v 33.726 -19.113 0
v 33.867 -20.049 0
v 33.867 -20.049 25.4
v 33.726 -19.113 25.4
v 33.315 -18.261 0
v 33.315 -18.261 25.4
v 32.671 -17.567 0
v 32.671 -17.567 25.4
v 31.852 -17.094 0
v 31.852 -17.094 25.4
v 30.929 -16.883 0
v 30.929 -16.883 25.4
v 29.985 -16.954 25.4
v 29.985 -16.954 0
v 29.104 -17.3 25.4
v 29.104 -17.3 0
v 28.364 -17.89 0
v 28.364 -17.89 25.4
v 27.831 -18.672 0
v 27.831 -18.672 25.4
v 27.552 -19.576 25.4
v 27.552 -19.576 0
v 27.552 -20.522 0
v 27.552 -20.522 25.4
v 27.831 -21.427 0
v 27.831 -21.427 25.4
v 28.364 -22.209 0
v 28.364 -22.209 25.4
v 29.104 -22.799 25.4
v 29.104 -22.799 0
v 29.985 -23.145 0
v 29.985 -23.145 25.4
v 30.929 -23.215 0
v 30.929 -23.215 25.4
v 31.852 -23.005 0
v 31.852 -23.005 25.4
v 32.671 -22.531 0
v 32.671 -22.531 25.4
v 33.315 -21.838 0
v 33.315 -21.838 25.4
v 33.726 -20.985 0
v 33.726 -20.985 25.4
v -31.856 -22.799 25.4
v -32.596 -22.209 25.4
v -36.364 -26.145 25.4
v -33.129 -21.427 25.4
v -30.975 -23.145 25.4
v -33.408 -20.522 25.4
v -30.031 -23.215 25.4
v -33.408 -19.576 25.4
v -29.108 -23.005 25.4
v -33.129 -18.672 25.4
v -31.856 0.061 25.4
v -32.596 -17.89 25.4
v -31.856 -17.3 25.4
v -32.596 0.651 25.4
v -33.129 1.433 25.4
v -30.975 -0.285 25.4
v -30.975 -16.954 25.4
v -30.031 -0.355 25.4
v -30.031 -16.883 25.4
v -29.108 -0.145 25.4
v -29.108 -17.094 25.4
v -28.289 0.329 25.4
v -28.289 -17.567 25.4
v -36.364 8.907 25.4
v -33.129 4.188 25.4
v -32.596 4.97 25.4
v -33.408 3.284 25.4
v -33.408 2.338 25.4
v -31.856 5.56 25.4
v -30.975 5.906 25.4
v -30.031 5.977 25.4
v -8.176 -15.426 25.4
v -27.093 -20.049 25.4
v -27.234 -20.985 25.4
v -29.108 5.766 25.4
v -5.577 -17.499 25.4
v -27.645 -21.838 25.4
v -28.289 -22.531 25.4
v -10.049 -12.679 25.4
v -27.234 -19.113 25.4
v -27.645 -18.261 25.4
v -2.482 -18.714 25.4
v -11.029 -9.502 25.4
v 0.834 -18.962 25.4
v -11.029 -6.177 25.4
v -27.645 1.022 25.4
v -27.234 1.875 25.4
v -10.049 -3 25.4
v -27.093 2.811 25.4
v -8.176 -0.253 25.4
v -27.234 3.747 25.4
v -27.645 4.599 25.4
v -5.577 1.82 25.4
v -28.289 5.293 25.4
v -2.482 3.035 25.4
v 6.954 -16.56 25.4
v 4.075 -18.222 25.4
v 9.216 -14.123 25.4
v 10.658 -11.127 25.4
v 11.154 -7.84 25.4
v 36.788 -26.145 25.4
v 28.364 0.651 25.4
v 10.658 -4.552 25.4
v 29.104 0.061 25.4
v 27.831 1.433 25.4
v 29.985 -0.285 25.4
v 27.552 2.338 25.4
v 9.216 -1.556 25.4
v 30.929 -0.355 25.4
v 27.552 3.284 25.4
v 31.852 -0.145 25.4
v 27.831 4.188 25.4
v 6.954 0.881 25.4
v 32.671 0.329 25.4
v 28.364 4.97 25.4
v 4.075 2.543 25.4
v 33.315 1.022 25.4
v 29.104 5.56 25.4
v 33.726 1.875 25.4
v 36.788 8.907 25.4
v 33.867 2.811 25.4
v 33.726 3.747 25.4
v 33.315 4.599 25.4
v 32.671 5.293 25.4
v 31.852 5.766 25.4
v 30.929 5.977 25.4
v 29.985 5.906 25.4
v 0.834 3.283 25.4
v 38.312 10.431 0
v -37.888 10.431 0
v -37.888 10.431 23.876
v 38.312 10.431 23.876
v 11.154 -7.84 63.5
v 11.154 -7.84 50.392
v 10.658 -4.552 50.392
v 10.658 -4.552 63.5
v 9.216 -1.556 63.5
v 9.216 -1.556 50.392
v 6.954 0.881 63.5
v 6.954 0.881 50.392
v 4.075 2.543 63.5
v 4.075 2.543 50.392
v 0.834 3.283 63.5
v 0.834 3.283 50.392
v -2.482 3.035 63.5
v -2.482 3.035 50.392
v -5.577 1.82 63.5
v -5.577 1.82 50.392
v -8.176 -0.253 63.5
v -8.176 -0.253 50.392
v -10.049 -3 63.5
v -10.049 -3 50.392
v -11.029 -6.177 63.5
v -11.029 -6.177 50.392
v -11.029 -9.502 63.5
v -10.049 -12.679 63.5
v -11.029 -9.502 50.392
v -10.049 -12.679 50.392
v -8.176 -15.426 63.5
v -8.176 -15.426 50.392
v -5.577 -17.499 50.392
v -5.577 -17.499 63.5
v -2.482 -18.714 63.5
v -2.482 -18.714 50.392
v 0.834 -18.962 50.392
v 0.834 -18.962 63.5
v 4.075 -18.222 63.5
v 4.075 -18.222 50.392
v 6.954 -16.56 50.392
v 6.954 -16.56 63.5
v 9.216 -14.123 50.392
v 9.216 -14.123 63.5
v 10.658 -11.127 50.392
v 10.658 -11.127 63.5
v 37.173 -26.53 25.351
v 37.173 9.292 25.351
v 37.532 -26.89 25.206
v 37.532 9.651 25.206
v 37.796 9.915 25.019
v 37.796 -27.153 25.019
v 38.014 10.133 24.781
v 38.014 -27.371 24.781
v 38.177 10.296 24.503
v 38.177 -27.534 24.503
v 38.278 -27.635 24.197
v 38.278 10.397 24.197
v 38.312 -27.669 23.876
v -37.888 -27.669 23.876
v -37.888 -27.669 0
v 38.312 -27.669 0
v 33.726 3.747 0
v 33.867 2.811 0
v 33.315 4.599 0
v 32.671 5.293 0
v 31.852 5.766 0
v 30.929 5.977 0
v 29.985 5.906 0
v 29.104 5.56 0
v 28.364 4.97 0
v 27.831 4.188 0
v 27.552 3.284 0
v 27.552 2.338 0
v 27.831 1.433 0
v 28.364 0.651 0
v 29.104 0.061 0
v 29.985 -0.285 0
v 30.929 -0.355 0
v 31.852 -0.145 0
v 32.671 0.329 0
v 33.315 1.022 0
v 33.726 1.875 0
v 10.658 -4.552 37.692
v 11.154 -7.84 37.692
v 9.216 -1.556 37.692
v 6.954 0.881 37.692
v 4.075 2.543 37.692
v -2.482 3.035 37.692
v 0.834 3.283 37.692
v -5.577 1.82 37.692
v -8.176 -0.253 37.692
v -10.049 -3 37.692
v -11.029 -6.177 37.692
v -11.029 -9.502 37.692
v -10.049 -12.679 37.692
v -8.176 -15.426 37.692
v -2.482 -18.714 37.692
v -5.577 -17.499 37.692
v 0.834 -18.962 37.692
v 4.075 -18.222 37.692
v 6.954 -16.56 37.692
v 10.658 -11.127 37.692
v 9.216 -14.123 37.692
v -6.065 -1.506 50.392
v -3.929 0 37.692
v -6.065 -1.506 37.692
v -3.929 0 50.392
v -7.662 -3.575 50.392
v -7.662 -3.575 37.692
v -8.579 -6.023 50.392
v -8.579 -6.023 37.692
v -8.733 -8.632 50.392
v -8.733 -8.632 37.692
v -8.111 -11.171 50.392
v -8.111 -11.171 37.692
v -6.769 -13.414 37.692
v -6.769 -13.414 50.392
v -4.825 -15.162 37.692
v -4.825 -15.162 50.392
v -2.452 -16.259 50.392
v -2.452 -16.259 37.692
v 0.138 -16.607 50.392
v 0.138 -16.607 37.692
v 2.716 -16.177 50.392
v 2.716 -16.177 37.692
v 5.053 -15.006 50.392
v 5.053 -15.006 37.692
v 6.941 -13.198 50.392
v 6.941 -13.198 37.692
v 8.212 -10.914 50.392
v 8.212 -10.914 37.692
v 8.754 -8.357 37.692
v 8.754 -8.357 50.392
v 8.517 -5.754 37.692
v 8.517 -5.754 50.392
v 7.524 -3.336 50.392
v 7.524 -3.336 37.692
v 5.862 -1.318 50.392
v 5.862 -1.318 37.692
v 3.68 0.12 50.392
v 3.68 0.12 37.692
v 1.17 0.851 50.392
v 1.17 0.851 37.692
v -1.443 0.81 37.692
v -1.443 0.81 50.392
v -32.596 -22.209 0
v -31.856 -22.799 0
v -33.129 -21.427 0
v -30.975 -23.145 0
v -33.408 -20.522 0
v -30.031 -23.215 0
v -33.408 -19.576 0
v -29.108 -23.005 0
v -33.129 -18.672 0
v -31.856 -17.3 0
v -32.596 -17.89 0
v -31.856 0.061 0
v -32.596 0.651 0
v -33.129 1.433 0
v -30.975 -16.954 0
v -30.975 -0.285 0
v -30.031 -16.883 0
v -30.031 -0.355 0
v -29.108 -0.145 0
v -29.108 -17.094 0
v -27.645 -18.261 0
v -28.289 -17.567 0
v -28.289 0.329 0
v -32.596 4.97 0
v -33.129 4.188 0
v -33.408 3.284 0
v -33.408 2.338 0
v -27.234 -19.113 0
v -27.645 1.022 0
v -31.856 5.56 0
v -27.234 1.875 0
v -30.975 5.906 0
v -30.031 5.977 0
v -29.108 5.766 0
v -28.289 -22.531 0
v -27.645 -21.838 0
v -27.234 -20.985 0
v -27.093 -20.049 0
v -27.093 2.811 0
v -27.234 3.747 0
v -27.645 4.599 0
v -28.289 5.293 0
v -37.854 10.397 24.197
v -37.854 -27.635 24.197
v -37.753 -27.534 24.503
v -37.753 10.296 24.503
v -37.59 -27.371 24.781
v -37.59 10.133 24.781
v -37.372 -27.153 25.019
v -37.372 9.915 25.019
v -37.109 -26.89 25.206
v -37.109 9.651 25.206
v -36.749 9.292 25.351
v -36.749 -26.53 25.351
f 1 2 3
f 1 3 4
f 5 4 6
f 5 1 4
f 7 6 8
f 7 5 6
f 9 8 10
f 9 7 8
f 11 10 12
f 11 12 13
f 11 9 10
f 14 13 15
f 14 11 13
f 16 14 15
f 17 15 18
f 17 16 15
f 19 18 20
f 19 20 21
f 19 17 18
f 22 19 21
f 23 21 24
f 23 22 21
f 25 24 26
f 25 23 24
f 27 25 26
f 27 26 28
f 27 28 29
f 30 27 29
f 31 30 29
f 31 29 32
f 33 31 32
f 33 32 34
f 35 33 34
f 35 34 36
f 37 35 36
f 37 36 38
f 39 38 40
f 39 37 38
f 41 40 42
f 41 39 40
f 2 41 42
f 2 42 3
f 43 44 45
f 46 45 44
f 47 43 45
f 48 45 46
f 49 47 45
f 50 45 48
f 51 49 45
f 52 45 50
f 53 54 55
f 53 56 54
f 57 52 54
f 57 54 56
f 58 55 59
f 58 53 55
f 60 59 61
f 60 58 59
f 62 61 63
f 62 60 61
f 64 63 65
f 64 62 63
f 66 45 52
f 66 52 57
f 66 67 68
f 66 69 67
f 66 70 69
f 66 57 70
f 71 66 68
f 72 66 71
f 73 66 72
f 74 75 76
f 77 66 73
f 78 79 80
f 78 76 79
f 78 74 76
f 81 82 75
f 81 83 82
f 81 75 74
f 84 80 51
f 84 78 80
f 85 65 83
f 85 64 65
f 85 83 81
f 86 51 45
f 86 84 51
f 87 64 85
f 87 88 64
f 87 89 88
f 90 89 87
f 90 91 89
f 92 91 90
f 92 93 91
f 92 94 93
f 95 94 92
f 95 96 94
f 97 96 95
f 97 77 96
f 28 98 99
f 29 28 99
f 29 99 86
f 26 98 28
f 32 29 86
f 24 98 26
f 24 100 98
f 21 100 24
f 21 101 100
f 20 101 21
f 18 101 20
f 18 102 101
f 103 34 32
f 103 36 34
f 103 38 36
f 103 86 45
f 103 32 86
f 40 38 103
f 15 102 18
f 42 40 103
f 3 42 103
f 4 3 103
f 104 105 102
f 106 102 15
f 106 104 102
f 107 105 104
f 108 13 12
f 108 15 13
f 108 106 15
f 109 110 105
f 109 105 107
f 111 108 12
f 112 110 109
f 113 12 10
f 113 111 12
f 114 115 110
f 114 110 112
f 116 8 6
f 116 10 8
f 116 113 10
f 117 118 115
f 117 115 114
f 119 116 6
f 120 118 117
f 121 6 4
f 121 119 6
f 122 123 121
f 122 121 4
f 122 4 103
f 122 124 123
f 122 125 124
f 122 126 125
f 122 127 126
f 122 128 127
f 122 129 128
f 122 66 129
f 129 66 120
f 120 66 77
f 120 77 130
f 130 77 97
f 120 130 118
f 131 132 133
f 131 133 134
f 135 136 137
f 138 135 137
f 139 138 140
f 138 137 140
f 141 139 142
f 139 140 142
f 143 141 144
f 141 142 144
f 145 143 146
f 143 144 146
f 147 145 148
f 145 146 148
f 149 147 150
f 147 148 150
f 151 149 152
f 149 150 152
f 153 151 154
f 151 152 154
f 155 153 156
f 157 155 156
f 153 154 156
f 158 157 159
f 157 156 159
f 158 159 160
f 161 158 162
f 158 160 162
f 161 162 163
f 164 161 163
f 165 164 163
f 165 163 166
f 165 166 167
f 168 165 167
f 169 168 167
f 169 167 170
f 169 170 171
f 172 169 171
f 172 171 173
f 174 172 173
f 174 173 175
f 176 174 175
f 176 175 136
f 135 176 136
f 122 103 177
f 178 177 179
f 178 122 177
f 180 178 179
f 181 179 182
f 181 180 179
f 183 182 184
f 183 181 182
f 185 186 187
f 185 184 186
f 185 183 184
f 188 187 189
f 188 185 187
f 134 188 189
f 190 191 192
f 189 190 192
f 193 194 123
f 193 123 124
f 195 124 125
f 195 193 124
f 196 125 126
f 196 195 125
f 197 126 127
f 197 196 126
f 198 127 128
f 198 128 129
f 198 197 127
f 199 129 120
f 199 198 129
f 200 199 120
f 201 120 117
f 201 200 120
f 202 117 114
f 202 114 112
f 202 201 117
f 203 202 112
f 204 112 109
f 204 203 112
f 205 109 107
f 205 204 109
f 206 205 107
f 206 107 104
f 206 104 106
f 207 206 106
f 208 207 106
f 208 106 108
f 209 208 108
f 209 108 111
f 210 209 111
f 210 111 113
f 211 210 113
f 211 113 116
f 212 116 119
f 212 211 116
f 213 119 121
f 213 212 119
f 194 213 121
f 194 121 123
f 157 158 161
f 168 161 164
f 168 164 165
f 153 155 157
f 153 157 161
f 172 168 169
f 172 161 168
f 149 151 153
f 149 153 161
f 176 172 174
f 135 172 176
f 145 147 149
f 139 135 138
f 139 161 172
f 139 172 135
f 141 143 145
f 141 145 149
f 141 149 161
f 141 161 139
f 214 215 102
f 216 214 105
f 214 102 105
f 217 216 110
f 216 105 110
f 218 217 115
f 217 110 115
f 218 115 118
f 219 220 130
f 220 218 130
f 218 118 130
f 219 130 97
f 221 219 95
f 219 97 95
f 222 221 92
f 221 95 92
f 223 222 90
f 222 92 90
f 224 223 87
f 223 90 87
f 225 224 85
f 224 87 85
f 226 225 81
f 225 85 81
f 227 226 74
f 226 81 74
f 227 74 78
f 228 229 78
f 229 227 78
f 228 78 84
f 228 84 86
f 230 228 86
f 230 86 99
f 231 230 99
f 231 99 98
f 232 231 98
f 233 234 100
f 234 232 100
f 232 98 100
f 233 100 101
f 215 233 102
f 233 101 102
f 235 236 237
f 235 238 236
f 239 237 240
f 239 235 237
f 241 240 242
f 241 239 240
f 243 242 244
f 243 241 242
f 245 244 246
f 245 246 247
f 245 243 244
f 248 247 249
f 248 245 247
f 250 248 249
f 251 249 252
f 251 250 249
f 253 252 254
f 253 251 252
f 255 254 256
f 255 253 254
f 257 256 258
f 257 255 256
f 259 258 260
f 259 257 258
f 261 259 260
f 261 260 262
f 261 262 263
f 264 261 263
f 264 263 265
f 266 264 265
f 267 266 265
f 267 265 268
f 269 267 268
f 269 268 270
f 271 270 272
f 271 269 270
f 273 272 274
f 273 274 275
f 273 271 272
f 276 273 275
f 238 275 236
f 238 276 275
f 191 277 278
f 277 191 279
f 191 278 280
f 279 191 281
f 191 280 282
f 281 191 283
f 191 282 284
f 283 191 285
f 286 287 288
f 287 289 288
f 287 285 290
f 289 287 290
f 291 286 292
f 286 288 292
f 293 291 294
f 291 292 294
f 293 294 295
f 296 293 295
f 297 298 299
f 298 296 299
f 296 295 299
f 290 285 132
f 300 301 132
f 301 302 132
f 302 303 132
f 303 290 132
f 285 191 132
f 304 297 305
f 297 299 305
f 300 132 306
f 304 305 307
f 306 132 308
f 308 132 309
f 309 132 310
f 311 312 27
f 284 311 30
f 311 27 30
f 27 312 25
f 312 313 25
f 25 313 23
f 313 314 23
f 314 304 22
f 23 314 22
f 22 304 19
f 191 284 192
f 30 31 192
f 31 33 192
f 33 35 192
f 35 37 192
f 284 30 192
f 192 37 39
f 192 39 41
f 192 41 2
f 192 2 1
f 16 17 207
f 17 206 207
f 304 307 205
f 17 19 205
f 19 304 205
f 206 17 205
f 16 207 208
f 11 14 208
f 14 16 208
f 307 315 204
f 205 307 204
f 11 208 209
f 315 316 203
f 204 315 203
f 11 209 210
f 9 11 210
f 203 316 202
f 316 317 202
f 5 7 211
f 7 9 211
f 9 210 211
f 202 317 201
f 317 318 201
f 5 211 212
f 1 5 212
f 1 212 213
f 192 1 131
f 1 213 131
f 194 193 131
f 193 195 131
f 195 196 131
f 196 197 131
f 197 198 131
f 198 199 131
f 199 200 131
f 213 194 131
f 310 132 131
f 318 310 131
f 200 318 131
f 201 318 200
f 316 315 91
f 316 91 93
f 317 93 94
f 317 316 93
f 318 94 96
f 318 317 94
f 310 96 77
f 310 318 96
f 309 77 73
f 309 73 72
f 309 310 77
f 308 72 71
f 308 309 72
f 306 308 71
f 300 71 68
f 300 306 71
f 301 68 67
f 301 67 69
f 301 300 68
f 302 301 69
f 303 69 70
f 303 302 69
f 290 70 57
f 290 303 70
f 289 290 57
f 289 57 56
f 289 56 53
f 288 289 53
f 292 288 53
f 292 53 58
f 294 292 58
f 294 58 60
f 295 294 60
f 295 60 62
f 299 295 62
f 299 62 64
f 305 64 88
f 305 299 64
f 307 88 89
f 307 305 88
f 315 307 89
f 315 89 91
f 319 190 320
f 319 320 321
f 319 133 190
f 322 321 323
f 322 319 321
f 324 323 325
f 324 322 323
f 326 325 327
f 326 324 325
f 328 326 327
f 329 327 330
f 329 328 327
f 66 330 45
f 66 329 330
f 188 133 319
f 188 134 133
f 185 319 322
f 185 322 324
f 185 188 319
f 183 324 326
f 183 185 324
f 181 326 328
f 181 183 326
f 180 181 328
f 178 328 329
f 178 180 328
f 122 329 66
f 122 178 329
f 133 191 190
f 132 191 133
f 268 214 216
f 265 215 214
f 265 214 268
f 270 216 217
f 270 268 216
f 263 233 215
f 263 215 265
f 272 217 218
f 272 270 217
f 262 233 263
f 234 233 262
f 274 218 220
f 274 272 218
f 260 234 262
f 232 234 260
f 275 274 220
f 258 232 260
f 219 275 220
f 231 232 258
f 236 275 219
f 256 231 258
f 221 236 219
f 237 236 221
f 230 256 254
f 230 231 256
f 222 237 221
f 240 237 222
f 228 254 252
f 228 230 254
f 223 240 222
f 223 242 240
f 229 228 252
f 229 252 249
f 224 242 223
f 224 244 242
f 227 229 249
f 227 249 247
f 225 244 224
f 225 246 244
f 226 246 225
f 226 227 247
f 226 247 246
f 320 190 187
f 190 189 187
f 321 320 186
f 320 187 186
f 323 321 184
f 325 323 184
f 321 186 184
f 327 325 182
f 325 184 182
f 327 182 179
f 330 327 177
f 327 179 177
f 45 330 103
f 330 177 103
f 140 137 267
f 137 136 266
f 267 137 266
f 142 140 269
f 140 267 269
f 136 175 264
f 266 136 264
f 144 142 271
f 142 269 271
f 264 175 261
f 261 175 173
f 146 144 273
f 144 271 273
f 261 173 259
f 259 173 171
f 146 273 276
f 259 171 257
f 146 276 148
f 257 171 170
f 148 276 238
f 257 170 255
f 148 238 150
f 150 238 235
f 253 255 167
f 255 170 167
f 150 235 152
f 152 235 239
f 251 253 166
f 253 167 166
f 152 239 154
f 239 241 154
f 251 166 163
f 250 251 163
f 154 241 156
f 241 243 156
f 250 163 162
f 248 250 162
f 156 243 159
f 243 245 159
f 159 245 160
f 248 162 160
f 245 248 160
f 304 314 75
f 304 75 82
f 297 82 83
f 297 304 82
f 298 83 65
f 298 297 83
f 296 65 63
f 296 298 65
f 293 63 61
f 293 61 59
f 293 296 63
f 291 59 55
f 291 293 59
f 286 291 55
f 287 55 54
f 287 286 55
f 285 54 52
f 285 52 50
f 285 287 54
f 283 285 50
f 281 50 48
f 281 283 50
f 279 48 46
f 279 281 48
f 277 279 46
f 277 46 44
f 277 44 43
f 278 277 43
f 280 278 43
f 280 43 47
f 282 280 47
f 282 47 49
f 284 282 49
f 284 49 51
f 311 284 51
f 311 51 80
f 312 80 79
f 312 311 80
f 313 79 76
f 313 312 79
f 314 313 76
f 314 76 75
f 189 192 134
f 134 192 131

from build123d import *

# Parameters (mm, degrees)
F0_W     = 76.2
F0_H     = 38.1
F1_DEPTH = 25.4
F2_R     = 3.175
F3_DEPTH = 25.4
F4_R     = 11.153796
F5_DEPTH = 38.1
F6_W     = 14.986
F6_H     = 12.7
F8_R     = 1.524


with BuildPart() as f1:
    # F0 (on Top) → F1 (new body)
    with BuildSketch(Plane.XY):
        with Locations((0.211801, -8.619163)):
            Rectangle(F0_W, F0_H)
    extrude(amount=F1_DEPTH)

    # F2 (on Top) → F3 (cut)
    with BuildSketch(Plane.XY):
        with Locations((-30.268199, 2.810837)):
            Circle(F2_R)
        with Locations((-30.268199, -20.049163)):
            Circle(F2_R)
        with Locations((30.691801, 2.810837)):
            Circle(F2_R)
        with Locations((30.691801, -20.049163)):
            Circle(F2_R)
    extrude(amount=F3_DEPTH, mode=Mode.SUBTRACT)

    # F4 (on face) → F5 (join)
    with BuildSketch(Plane.XY.offset(25.4)):
        with Locations((0, -7.839597)):
            Circle(F4_R)
    extrude(amount=F5_DEPTH)

    # F6 (on Front) → F7 (revolve, cut)
    with BuildSketch(Plane.XZ):
        with Locations((-11.421585, 44.041961)):
            Rectangle(F6_W, F6_H)
    revolve(axis=Axis((0, -7.839597, 63.5), (0, 0, 1)), mode=Mode.SUBTRACT)

    # F8
    f8_edges = [f1.edges().sort_by_distance(p)[0] for p in [
        (0.211801, -27.669163, 25.4),
        (-37.888199, -8.619163, 25.4),
        (0.211801, 10.430837, 25.4),
        (38.311801, -8.619163, 25.4),
    ]]
    fillet(f8_edges, radius=F8_R)


solid = f1.part
